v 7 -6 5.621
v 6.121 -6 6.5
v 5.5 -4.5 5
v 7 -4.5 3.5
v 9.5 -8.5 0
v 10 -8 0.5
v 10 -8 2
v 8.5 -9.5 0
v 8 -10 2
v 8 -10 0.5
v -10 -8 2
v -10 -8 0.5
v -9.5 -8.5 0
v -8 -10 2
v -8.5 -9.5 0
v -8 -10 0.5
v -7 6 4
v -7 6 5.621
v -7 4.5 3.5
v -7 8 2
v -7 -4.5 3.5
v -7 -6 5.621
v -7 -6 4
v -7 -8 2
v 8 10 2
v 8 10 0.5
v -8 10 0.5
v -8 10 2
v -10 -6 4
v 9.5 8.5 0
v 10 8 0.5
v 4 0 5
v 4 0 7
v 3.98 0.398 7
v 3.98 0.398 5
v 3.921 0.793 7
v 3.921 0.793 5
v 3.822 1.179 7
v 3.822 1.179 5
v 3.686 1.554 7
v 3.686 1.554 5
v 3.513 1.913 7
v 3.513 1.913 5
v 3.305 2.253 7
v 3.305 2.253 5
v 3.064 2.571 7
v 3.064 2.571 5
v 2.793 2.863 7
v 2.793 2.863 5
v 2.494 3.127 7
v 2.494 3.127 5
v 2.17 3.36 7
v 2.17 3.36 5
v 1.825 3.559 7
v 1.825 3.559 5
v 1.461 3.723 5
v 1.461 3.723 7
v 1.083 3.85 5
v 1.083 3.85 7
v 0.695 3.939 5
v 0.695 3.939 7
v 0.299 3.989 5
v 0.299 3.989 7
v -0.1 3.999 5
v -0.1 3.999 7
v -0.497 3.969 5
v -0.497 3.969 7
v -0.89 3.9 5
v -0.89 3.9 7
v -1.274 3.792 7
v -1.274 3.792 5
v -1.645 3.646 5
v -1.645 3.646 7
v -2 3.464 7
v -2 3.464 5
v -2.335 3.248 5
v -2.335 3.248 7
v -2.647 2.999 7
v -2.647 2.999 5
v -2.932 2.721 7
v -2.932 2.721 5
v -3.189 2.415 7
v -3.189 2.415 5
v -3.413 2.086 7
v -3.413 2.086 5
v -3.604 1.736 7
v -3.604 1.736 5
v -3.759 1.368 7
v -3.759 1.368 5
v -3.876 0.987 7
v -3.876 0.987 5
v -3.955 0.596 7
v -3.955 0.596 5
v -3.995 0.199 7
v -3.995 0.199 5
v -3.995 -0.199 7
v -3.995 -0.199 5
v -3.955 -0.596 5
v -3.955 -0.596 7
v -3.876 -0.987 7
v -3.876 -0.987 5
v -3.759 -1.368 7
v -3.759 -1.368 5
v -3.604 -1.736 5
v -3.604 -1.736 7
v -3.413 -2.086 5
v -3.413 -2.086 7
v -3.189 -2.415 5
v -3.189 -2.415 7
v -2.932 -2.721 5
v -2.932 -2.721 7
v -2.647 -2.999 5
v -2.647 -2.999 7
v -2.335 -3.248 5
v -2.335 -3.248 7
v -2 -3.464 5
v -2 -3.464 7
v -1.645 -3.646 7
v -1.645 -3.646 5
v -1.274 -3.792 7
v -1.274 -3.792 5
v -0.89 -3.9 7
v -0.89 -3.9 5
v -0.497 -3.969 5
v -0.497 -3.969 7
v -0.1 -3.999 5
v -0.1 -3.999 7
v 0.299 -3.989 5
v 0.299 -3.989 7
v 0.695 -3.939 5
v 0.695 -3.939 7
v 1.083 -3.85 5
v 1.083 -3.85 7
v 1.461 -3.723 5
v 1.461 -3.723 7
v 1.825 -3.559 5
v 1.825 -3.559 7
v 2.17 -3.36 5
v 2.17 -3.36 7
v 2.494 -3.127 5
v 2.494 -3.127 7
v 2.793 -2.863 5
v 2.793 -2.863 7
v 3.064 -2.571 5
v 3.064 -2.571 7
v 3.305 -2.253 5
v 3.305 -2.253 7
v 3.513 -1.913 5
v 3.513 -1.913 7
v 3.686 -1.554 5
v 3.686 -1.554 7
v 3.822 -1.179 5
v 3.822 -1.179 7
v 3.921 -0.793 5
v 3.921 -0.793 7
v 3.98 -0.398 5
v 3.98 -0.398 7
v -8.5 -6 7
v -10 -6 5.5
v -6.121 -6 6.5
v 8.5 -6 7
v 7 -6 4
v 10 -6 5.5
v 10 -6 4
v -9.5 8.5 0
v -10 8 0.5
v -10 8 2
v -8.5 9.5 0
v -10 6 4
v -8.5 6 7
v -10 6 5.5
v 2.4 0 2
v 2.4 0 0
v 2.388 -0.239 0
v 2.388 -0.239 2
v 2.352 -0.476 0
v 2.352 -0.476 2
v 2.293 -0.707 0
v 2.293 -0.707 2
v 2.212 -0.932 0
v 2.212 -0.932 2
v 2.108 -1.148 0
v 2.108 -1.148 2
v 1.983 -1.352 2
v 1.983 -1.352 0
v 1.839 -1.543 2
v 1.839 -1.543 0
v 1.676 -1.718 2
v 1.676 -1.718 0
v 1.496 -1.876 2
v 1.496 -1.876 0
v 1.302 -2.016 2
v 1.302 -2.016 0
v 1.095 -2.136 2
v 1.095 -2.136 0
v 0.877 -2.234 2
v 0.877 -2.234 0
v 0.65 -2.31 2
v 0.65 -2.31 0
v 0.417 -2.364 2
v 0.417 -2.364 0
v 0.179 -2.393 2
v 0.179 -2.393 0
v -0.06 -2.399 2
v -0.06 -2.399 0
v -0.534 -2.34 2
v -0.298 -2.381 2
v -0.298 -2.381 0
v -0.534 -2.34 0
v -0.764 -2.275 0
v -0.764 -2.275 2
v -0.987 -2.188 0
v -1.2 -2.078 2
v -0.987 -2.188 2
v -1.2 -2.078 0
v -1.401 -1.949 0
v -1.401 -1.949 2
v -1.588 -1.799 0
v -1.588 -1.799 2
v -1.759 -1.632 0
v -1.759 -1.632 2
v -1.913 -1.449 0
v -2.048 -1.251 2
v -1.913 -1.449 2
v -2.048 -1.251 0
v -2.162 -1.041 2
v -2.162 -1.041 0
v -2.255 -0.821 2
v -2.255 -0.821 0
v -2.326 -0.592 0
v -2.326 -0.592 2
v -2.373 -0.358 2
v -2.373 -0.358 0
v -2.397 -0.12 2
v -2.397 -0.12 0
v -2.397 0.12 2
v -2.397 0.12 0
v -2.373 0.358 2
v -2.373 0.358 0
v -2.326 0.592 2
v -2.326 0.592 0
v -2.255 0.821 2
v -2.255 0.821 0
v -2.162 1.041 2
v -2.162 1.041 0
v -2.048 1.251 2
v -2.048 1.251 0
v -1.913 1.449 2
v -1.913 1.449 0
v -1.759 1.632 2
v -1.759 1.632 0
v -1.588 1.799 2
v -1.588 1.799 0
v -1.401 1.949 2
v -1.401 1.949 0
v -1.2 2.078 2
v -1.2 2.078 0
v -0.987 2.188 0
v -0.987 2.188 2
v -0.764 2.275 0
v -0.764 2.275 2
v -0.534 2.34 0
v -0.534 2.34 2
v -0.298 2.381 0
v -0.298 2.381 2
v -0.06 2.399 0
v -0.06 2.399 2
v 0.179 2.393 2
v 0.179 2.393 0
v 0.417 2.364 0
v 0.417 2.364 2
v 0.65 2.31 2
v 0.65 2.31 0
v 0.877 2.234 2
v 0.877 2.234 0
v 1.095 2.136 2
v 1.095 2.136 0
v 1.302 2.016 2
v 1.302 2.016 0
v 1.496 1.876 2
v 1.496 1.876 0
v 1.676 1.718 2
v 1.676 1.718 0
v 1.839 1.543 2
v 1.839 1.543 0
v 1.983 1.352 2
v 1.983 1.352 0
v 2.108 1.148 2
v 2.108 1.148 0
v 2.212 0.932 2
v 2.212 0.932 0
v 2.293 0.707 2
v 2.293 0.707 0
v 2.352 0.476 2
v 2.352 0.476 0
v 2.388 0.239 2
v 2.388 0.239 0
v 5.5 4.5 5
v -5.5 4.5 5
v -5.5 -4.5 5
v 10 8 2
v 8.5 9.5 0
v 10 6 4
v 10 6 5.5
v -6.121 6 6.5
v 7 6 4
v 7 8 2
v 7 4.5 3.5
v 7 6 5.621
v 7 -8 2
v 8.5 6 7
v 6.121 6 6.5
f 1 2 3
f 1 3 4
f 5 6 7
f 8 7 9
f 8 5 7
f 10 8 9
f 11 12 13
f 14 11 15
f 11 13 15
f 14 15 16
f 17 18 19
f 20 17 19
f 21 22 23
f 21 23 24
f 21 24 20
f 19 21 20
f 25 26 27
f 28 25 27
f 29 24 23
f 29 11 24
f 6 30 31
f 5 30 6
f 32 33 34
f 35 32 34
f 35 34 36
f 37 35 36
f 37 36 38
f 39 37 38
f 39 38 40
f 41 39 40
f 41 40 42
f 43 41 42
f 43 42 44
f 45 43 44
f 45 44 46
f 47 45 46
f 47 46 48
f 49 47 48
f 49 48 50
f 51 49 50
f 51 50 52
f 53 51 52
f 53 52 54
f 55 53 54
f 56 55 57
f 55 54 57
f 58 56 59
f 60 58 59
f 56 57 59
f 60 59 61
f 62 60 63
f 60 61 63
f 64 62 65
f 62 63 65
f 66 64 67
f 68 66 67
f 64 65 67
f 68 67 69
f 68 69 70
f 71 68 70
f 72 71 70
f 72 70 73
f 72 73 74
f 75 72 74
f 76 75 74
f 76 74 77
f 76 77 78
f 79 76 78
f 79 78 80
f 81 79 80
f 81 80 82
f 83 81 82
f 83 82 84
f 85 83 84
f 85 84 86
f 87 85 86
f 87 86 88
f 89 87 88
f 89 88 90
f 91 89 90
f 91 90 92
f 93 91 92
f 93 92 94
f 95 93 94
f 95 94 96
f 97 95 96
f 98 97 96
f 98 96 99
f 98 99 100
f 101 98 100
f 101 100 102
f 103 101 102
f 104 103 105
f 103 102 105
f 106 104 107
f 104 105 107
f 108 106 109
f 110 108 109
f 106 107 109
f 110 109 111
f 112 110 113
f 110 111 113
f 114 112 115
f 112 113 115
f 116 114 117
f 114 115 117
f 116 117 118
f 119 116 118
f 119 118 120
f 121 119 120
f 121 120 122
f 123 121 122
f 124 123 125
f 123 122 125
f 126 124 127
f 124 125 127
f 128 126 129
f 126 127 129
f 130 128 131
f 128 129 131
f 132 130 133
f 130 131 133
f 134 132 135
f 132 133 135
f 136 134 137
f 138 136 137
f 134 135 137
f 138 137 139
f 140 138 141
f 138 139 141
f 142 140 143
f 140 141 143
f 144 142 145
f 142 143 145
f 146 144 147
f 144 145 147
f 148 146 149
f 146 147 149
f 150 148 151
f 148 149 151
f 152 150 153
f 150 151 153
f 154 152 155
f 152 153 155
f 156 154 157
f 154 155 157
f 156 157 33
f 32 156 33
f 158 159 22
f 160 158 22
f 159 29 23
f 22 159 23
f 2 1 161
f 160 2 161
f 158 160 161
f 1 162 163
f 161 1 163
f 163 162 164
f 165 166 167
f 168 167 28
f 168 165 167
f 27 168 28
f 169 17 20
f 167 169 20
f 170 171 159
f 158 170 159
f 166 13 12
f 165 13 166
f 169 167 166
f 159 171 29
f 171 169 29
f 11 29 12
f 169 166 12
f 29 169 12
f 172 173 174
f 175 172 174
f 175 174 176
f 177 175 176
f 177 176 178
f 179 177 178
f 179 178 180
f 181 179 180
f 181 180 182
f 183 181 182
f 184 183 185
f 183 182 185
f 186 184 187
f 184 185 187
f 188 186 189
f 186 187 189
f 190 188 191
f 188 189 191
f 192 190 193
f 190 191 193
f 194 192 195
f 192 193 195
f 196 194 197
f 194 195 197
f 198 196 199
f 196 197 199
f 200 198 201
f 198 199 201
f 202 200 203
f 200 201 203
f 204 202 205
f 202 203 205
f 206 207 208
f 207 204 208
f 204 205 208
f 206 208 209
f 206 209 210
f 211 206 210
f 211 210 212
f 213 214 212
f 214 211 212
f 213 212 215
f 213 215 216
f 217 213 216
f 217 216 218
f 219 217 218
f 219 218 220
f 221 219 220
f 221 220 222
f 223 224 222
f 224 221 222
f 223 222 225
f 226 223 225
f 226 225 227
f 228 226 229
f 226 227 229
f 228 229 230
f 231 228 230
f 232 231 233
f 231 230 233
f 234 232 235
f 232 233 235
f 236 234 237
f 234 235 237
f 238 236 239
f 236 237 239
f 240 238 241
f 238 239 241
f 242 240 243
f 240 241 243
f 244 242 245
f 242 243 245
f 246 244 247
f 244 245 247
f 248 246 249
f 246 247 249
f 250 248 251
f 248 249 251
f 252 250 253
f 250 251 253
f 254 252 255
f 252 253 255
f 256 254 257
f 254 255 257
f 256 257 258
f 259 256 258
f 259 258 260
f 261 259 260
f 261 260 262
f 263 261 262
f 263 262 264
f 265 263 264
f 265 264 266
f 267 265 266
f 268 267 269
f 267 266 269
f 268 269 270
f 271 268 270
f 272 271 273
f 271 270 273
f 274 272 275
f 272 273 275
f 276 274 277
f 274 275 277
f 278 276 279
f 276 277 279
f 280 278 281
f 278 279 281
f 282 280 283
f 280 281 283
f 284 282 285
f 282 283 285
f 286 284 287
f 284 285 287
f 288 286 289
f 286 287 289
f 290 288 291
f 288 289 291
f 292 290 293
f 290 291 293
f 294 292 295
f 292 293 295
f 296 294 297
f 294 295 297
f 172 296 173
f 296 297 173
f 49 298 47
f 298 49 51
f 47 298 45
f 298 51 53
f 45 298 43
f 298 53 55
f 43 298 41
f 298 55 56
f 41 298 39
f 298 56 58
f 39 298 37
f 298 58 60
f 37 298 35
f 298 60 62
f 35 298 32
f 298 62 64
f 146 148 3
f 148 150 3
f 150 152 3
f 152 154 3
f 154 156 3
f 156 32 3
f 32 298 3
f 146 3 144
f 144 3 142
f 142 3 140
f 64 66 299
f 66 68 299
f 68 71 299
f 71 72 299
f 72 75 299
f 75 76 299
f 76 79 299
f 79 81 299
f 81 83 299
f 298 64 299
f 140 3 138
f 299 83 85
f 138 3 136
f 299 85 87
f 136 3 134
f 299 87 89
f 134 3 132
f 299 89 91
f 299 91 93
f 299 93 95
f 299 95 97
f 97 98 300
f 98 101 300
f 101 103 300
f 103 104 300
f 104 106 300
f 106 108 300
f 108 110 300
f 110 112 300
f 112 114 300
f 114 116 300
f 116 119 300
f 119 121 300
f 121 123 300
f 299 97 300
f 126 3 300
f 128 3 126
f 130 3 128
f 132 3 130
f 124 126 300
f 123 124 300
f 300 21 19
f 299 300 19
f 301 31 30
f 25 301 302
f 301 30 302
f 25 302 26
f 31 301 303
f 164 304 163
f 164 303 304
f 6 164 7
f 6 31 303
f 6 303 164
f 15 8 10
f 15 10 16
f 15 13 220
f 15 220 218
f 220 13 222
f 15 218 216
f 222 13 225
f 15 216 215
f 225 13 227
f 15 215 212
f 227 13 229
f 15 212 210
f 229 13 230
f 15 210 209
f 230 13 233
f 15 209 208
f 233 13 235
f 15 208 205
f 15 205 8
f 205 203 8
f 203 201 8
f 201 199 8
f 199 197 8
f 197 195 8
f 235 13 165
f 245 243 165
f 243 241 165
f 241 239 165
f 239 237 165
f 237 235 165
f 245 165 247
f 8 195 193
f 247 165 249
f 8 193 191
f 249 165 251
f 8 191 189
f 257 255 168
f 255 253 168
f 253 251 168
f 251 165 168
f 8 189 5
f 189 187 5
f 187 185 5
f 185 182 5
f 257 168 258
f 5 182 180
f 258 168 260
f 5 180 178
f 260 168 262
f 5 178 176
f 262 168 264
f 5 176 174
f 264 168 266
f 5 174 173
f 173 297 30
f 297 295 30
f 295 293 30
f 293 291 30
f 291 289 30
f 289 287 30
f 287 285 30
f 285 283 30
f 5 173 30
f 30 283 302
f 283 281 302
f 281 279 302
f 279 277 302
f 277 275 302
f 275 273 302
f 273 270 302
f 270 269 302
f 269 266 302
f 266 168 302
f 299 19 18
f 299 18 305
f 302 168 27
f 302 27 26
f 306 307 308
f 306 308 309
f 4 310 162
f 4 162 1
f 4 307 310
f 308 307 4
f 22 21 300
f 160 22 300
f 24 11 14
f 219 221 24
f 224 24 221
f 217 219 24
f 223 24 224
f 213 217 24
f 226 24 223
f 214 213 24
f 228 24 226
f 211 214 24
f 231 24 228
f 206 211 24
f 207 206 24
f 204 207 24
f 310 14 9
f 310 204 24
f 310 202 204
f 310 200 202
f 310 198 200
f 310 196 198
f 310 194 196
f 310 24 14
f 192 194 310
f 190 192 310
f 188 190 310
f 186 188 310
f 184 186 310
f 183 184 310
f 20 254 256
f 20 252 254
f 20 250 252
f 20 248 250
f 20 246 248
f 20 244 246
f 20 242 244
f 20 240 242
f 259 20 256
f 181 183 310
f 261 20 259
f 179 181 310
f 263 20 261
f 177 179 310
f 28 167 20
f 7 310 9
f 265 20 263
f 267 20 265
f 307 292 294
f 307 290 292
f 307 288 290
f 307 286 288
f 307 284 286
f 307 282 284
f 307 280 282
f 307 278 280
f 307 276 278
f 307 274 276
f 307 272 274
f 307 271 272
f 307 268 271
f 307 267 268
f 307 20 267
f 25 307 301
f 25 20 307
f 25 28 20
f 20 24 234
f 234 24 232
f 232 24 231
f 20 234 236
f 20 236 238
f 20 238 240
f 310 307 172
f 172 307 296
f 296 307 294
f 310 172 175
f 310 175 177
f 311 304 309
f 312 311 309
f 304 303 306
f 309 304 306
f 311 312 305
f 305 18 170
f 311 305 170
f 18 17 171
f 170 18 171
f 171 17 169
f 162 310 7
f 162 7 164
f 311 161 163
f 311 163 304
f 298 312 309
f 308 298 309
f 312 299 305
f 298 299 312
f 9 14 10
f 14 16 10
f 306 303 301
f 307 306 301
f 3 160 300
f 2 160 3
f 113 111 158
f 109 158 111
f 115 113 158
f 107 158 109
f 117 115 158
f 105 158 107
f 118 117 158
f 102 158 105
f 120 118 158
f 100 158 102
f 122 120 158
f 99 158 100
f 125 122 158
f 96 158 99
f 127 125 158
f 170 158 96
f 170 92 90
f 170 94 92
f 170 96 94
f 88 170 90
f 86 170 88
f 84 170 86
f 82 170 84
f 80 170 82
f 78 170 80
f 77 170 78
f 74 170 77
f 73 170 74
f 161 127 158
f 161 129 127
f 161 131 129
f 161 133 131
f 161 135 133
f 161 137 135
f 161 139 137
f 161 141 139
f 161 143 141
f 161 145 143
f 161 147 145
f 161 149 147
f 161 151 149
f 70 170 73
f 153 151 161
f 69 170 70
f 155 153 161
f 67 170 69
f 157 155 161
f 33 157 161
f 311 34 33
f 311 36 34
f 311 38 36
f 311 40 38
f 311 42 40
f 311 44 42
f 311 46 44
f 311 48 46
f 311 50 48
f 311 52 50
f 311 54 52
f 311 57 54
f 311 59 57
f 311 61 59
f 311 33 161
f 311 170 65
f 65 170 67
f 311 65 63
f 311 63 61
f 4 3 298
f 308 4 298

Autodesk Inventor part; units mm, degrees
ref_plane "YZ Plane" through (0, 0, 0) normal (1, 0, 0) x (0, 1, 0)
ref_plane "XZ Plane" through (0, 0, 0) normal (0, 1, 0) x (-1, 0, 0)
ref_plane "XY Plane" through (0, 0, 0) normal (0, 0, 1) x (1, 0, 0)
sketch "Sketch1" plane through (0, 0, 0) normal (0, 0, 1) x (1, 0, 0)
  line L0 (-10, -10) -> (10, -10)
  line L1 (10, -10) -> (10, 10)
  line L2 (10, 10) -> (-10, 10)
  line L3 (-10, 10) -> (-10, -10)
  line L4 (-10, -10) -> (10, 10) construction
  line L5 (10, -10) -> (-10, 10) construction
  circle A0 centre (0, 0) radius 2.4
  dimension "d0" = 20
  dimension "d1" = 20
  dimension "d2" = 4.8
extrude "Extrusion1" add sketch "Sketch1" along normal blind 2
chamfer "Chamfer1" distance 0.5 angle 45 4 edges at (10, 0, 0) (0, 10, 0) (-10, 0, 0) (0, -10, 0)
sketch "Sketch2" plane through (0, 0, 2) normal (0, 0, 1) x (1, 0, 0)
  line L0 (10, 10) -> (10, -10) projected
  line L1 (-10, -6) -> (10, -6)
  line L2 (10, -6) -> (10, 6)
  line L3 (10, 6) -> (-10, 6)
  line L4 (-10, 6) -> (-10, -6)
  line L5 (-10, -6) -> (10, 6) construction
  line L6 (10, -6) -> (-10, 6) construction
  point P0 (0, 0)
  point P1 (10, -6)
  dimension "d8" = 12
extrude "Extrusion2" add sketch "Sketch2" along normal blind 5
sketch "Sketch5" plane through (-10, -6, 2) normal (0, -1, 0) x (1, 0, 0)
  line L0 (20, 0) -> (0, 0) projected
  line L1 (3, 0) -> (17, 0)
  line L2 (17, 0) -> (17, 3)
  line L3 (17, 3) -> (3, 3)
  line L4 (3, 3) -> (3, 0)
  line L5 (0, 0) -> (0, 5) projected
  line L6 (20, 0) -> (20, 5) projected
  point P0 (10, -2)
  dimension "d18" = 3
  dimension "d19" = 3
  dimension "d20" = 3
extrude "Extrusion4" cut sketch "Sketch5" against normal through all
sketch "Sketch6" plane through (0, 0, 7) normal (0, 0, 1) x (1, 0, 0)
  circle A0 centre (0, 0) radius 2.4 construction
  circle A1 centre (0, 0) radius 4
  dimension "d23" = 8
extrude "Extrusion5" cut sketch "Sketch6" against normal up to surface (5 mm away)
chamfer "Chamfer4" distance 1.5 angle 45 2 edges at (-7, 0, 5) (7, 0, 5)
chamfer "Chamfer5" distance 1.5 angle 45 6 edges at (0, -6, 5) (0, 6, 5) (-6.25, -6, 4.25) (6.25, -6, 4.25) (6.25, 6, 4.25) (-6.25, 6, 4.25)
chamfer "Chamfer6" distance 1.5 angle 45 2 edges at (-10, 0, 7) (10, 0, 7)
chamfer "Chamfer7" distance 2 angle 45 8 edges at (10, 10, 1.25) (-10, 10, 1.25) (-10, -10, 1.25) (10, -10, 1.25) (8.5, -6, 2) (-8.5, -6, 2) (-8.5, 6, 2) (8.5, 6, 2)
properties part number "CableHolder"
